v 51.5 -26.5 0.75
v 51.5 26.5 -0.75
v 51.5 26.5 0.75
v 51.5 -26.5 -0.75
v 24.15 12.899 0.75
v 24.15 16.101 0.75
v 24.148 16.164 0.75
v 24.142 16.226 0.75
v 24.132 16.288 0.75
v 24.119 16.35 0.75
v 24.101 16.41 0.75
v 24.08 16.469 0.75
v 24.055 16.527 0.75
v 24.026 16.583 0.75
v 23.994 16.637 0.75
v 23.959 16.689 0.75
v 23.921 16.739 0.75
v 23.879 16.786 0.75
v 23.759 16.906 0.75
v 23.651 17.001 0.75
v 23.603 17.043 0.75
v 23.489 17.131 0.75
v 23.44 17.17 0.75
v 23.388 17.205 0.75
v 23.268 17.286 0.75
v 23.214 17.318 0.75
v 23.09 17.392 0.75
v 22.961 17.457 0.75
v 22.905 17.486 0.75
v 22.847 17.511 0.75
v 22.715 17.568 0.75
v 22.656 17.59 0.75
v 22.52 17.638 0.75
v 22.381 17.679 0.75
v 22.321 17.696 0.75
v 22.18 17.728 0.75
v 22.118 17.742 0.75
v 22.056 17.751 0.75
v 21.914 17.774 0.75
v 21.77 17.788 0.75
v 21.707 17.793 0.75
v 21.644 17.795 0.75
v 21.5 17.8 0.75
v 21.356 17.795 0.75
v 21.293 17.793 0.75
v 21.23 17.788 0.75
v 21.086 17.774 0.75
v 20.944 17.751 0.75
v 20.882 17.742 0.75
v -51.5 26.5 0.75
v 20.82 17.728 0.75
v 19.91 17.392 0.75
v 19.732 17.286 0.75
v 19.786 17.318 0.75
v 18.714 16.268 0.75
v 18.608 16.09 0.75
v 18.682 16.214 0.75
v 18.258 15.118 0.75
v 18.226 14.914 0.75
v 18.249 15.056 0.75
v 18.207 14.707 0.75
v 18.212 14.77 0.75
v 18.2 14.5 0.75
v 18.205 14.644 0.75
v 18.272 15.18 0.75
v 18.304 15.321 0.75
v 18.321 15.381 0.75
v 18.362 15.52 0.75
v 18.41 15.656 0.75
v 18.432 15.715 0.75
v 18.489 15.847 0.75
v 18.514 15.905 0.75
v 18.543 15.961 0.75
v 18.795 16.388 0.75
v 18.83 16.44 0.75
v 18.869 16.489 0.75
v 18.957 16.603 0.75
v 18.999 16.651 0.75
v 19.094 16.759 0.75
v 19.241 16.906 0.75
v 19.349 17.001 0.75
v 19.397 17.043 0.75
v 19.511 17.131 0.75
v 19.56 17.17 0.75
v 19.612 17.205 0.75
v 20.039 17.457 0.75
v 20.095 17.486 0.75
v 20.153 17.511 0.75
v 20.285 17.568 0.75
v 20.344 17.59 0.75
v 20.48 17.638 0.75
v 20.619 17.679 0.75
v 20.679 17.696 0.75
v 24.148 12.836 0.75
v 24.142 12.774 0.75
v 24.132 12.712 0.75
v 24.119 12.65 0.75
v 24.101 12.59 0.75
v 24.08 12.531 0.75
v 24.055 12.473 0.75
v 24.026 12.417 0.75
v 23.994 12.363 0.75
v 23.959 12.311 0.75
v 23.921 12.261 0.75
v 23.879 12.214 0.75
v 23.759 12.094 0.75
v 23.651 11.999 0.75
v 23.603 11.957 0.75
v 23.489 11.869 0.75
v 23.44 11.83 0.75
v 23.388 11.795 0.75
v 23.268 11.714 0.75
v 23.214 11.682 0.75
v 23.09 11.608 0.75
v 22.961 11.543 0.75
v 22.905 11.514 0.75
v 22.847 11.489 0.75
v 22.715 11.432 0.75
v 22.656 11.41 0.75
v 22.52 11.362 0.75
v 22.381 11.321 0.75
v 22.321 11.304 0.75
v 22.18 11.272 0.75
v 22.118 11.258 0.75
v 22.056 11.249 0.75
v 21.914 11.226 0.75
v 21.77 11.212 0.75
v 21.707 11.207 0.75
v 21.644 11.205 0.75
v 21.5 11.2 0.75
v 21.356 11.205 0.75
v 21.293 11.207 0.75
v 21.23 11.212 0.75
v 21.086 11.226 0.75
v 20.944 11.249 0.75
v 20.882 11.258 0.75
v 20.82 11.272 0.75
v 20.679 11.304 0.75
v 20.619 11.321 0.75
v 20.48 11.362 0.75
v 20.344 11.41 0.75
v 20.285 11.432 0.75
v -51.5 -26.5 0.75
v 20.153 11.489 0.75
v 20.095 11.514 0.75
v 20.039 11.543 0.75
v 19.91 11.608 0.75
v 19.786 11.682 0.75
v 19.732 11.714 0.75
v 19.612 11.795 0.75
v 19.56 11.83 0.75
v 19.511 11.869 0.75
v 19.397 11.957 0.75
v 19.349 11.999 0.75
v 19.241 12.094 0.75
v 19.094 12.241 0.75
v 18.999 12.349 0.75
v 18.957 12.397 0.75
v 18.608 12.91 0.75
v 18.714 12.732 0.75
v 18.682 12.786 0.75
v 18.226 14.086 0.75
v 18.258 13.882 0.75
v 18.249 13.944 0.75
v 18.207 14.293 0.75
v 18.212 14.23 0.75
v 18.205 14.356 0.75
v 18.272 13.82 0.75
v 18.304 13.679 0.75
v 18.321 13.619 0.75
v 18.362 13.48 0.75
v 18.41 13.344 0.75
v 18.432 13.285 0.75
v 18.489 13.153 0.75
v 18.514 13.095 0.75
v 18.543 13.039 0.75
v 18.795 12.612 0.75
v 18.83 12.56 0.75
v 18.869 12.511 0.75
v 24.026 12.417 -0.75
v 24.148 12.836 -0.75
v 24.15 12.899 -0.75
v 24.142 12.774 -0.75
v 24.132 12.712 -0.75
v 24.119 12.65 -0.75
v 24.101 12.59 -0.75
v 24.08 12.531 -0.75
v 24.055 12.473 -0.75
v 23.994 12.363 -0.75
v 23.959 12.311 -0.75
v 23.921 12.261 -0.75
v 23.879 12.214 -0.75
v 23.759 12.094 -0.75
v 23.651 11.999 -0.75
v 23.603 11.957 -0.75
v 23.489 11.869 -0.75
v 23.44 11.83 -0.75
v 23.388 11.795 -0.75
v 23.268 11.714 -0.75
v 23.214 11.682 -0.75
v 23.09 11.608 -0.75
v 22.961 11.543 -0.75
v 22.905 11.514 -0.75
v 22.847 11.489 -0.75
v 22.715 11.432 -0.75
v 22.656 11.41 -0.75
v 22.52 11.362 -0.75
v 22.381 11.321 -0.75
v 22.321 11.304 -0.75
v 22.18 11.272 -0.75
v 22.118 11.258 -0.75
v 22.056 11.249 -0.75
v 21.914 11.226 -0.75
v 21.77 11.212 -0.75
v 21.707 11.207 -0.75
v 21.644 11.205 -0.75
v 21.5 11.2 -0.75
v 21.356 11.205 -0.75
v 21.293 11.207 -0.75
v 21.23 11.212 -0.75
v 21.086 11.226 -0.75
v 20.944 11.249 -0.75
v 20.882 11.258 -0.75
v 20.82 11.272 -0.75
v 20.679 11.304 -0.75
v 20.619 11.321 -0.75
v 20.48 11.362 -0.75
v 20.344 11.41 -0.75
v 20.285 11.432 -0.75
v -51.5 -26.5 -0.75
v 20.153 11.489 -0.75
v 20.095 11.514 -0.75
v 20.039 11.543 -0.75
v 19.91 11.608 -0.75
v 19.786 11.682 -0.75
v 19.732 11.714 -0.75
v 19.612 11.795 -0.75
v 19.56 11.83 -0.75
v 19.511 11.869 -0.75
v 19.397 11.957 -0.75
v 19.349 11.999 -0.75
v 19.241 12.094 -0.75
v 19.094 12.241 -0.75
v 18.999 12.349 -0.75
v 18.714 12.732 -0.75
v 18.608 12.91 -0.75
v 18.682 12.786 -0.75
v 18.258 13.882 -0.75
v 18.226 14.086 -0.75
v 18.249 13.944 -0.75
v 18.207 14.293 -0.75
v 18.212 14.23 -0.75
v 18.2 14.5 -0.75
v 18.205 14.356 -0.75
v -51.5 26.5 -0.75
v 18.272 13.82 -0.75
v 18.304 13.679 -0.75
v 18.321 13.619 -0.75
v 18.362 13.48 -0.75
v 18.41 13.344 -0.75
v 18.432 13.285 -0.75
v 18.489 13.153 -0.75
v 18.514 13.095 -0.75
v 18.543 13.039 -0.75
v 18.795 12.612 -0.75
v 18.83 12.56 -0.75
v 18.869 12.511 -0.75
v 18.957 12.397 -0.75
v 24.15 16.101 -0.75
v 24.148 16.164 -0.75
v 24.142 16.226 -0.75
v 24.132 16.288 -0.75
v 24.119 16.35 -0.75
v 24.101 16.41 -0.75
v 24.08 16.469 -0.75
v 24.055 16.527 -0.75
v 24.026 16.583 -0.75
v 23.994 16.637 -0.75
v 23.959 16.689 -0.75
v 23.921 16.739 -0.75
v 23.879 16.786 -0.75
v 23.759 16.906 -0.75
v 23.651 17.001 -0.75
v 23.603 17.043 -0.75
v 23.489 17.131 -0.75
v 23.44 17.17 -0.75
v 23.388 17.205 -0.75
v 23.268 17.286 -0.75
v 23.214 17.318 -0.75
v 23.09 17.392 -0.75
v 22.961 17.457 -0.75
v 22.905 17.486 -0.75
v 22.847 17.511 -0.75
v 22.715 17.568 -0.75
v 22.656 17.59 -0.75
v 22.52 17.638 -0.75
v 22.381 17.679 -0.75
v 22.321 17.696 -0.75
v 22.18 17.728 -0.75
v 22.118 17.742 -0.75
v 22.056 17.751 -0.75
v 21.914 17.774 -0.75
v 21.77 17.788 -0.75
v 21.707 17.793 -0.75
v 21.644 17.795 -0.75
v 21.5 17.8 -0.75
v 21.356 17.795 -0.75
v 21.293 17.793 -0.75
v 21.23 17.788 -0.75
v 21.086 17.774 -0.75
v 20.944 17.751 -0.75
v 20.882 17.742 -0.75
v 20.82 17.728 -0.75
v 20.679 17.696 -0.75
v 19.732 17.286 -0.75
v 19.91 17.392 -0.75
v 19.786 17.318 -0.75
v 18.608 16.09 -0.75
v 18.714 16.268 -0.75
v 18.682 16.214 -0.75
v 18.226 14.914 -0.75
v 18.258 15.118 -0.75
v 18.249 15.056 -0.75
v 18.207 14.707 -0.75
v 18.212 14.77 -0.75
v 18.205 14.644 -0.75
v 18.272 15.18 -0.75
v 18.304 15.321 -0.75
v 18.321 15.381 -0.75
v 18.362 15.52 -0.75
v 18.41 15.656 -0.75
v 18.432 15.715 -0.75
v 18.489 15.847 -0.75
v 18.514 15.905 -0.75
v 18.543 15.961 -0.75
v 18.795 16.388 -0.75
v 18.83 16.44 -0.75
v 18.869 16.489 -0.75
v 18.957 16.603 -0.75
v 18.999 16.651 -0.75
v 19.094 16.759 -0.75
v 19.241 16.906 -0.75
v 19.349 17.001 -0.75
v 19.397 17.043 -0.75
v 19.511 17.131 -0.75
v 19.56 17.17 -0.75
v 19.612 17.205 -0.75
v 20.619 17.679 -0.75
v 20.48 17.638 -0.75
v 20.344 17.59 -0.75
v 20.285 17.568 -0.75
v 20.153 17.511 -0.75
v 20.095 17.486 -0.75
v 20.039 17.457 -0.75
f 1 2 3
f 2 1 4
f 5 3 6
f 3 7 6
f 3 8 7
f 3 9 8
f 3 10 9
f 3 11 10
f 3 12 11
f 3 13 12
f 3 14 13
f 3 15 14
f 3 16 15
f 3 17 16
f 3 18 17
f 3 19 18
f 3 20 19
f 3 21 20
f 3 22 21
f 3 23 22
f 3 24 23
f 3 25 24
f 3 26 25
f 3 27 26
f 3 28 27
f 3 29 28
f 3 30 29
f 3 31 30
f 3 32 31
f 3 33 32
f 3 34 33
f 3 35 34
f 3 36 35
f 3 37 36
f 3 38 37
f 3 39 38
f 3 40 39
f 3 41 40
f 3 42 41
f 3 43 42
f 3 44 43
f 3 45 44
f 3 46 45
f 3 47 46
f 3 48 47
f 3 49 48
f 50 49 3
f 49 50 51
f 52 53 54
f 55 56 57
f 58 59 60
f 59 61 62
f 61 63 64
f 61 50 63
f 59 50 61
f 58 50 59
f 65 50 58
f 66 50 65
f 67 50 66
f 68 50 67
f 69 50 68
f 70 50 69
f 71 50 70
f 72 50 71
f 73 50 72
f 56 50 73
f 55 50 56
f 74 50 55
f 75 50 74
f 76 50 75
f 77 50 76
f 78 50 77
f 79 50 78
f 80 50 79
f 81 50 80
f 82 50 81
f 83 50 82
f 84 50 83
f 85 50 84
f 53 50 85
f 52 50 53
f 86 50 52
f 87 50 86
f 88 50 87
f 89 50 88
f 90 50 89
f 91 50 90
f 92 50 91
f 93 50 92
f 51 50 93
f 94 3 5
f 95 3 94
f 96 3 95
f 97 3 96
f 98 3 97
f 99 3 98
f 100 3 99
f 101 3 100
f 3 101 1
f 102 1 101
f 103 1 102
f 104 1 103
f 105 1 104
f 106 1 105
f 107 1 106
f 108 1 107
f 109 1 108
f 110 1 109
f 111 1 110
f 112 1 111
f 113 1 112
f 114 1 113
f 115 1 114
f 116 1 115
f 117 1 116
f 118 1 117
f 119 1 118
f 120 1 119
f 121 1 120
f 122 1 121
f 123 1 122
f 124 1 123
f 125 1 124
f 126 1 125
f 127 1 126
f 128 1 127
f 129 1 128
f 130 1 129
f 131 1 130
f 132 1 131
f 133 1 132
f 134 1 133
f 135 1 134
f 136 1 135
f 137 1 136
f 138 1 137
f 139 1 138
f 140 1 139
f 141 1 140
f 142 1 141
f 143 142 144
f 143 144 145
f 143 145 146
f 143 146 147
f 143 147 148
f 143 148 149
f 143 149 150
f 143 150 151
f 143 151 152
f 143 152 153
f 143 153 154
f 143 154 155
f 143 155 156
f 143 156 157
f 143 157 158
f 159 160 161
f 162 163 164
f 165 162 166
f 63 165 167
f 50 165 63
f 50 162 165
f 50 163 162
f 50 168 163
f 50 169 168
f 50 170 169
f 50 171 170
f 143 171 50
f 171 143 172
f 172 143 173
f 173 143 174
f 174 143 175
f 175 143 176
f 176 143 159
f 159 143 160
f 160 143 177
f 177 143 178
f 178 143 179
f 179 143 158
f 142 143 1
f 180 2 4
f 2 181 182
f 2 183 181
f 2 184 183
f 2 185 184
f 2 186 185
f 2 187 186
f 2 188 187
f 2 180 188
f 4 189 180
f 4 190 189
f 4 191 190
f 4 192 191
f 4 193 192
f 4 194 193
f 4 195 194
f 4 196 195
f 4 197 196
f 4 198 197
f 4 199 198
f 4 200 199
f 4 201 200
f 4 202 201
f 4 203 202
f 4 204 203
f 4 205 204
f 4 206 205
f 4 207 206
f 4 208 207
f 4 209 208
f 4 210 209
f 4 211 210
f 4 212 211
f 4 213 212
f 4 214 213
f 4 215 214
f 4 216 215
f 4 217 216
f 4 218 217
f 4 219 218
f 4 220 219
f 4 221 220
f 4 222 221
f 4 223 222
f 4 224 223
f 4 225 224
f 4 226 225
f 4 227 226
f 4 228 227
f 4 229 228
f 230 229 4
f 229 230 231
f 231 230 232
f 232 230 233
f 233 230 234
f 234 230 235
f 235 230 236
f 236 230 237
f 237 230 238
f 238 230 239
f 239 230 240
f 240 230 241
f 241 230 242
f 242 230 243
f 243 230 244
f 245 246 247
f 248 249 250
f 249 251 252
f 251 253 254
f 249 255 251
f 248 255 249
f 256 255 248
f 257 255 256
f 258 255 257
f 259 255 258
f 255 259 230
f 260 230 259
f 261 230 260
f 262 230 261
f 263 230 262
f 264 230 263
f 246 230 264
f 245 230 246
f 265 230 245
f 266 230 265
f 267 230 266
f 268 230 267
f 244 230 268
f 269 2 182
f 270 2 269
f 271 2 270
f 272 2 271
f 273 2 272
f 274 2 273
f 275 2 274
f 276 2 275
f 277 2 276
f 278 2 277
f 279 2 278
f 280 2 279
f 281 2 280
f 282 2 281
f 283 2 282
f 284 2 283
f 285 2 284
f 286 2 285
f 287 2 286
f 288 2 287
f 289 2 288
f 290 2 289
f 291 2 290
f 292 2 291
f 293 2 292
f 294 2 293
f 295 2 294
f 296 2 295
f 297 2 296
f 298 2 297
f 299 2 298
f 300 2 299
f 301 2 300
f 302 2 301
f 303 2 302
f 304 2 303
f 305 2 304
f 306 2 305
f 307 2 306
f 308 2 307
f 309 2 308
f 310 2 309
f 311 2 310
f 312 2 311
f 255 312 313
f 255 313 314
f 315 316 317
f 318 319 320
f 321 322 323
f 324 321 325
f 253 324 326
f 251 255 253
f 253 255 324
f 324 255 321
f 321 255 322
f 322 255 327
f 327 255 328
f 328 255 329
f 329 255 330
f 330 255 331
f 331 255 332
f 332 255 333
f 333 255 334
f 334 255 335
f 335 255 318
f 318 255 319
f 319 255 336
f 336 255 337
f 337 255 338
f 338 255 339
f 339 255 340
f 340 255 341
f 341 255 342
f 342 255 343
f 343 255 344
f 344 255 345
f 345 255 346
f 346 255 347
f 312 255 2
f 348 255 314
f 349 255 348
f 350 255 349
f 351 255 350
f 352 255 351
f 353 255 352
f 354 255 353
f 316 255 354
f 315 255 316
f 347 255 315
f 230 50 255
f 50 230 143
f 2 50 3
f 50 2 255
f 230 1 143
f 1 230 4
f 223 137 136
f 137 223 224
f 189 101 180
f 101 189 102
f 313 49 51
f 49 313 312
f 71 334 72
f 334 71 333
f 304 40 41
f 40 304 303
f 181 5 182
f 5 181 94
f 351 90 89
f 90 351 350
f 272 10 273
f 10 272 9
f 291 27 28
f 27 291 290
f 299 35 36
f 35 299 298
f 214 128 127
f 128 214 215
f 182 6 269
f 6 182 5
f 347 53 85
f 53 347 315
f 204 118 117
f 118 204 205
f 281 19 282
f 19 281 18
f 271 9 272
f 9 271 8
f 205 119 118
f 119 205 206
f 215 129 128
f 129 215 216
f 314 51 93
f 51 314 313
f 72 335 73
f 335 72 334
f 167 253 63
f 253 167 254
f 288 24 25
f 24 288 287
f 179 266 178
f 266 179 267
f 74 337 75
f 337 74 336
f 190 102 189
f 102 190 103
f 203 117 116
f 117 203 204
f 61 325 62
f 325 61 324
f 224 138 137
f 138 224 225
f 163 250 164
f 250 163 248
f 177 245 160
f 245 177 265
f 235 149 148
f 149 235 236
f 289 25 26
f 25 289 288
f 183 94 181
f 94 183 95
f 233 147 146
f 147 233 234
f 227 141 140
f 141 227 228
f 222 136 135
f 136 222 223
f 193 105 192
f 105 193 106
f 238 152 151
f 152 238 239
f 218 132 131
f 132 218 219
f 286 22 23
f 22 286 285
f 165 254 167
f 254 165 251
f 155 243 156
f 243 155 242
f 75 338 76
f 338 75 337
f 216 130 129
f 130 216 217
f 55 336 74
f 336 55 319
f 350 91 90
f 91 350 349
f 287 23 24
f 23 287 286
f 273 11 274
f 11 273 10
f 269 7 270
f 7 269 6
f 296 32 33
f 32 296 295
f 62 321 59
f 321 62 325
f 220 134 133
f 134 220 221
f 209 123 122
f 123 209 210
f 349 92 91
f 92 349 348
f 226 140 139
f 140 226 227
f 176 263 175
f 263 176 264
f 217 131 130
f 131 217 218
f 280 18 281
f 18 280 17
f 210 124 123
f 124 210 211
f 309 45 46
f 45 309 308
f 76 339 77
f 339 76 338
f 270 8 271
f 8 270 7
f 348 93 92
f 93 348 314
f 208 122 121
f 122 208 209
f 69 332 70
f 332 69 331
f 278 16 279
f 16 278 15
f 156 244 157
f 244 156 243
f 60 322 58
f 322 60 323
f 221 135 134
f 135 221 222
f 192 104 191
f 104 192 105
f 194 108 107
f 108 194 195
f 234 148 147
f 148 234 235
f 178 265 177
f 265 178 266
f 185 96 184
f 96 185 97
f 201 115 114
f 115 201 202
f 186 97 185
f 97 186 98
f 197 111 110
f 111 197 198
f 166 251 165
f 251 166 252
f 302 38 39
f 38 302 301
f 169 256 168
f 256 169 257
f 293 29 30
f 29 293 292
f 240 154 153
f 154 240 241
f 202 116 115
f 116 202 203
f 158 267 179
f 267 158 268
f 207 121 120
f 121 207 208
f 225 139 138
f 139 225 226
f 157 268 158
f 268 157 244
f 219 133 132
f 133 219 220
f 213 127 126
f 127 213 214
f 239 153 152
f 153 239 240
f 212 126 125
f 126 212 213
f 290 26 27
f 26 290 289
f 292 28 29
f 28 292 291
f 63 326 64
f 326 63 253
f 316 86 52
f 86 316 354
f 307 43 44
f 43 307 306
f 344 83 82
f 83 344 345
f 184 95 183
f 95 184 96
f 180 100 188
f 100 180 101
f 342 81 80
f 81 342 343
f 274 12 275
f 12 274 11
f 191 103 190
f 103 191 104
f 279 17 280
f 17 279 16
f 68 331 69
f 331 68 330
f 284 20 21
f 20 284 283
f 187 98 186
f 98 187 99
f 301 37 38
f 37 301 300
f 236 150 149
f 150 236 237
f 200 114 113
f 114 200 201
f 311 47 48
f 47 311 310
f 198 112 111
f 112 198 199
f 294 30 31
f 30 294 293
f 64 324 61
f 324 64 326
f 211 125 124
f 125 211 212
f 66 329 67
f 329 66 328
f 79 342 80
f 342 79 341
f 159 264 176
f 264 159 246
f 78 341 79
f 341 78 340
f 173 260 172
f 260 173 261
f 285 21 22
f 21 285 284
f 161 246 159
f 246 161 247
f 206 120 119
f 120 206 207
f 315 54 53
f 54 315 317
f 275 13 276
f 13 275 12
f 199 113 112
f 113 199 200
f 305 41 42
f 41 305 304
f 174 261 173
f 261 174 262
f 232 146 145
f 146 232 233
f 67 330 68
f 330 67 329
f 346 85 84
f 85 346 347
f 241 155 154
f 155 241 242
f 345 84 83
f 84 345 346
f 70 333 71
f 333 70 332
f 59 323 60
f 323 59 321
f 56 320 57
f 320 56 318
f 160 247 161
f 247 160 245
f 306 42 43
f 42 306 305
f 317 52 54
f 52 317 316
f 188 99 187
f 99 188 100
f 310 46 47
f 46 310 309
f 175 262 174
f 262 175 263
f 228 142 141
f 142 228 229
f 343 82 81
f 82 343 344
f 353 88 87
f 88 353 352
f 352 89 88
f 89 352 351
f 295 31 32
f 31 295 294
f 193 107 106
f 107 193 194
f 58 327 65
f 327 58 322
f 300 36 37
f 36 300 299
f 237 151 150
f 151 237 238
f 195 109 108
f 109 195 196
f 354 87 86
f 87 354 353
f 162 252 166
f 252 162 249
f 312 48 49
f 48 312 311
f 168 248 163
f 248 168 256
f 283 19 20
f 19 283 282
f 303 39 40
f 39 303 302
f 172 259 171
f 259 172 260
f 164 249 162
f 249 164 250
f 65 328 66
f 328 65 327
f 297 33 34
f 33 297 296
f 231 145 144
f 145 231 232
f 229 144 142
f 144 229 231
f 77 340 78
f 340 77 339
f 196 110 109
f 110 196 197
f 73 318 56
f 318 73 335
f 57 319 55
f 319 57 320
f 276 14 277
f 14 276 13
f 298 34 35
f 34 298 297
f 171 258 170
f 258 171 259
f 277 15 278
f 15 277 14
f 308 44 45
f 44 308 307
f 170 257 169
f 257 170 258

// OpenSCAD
//CELICKO ZADNI
//---------------------------------------
$fn=100;
//PARAMETRY CELICKA OD VYROBCE
//rozměr čelíčka
celicko_x=103;
celicko_y=53;
celicko_z=1.5;

//otvory v celisku od vyrobce
celicko_dira_prumer=3.5;
celicko_dira_souradniceX=95.02/2; //souradnice od stredu celicka
celicko_dira_souradniceY=45/2;    //souradnice od stredu celicka
//---------------------------------------

//PRUMER FREZY
freza_prumer=2;

//OTVORY FREZA
//otvor_1 - pro SMA
otvor1_prumer=6.6;
otvor1_vyska=5.95; //vyska srazene hrany
otvor1_souradniceX=21.5; //souradnice od stredu celicka
otvor1_souradniceY=14.5; //souradnice od stredu celicka

//---------------------------------------

CELICKO_VYSLEDNE();

module CELICKO_VYSLEDNE(){
    difference() {
        CELICKO_OD_VYROBCE();
    
        //otvor1
        translate([otvor1_souradniceX,otvor1_souradniceY,0])  
            minkowski() {
                difference() { 
                    cylinder(celicko_z, d=otvor1_prumer-freza_prumer, center=true); 
                    translate([otvor1_vyska-freza_prumer,0,0])
                        cube([otvor1_prumer-freza_prumer,otvor1_prumer-freza_prumer,celicko_z+0.1],center=true); 
            }  
                cylinder(r=freza_prumer/2,h=0.01, center=true);
                        }  
    
                } 
} 

module CELICKO_OD_VYROBCE(){
    difference() {
        cube([celicko_x,celicko_y,celicko_z],center=true);

/*
//otvory na srouby    
translate([celicko_dira_souradniceX,celicko_dira_souradniceY,0])  
    cylinder(celicko_z+0.01, d=celicko_dira_prumer, center=true);   
     zakomentováno díry neodpovídají realitě, značná nepřesnost výrobce
translate([-celicko_dira_souradniceX,celicko_dira_souradniceY,0])  
    cylinder(celicko_z+0.01, d=celicko_dira_prumer, center=true); 

translate([celicko_dira_souradniceX,-celicko_dira_souradniceY,0])  
    cylinder(celicko_z+0.01, d=celicko_dira_prumer, center=true); 

translate([-celicko_dira_souradniceX,-celicko_dira_souradniceY,0])  
    cylinder(celicko_z+0.01, d=celicko_dira_prumer, center=true);  
   */ 
} 
} 
